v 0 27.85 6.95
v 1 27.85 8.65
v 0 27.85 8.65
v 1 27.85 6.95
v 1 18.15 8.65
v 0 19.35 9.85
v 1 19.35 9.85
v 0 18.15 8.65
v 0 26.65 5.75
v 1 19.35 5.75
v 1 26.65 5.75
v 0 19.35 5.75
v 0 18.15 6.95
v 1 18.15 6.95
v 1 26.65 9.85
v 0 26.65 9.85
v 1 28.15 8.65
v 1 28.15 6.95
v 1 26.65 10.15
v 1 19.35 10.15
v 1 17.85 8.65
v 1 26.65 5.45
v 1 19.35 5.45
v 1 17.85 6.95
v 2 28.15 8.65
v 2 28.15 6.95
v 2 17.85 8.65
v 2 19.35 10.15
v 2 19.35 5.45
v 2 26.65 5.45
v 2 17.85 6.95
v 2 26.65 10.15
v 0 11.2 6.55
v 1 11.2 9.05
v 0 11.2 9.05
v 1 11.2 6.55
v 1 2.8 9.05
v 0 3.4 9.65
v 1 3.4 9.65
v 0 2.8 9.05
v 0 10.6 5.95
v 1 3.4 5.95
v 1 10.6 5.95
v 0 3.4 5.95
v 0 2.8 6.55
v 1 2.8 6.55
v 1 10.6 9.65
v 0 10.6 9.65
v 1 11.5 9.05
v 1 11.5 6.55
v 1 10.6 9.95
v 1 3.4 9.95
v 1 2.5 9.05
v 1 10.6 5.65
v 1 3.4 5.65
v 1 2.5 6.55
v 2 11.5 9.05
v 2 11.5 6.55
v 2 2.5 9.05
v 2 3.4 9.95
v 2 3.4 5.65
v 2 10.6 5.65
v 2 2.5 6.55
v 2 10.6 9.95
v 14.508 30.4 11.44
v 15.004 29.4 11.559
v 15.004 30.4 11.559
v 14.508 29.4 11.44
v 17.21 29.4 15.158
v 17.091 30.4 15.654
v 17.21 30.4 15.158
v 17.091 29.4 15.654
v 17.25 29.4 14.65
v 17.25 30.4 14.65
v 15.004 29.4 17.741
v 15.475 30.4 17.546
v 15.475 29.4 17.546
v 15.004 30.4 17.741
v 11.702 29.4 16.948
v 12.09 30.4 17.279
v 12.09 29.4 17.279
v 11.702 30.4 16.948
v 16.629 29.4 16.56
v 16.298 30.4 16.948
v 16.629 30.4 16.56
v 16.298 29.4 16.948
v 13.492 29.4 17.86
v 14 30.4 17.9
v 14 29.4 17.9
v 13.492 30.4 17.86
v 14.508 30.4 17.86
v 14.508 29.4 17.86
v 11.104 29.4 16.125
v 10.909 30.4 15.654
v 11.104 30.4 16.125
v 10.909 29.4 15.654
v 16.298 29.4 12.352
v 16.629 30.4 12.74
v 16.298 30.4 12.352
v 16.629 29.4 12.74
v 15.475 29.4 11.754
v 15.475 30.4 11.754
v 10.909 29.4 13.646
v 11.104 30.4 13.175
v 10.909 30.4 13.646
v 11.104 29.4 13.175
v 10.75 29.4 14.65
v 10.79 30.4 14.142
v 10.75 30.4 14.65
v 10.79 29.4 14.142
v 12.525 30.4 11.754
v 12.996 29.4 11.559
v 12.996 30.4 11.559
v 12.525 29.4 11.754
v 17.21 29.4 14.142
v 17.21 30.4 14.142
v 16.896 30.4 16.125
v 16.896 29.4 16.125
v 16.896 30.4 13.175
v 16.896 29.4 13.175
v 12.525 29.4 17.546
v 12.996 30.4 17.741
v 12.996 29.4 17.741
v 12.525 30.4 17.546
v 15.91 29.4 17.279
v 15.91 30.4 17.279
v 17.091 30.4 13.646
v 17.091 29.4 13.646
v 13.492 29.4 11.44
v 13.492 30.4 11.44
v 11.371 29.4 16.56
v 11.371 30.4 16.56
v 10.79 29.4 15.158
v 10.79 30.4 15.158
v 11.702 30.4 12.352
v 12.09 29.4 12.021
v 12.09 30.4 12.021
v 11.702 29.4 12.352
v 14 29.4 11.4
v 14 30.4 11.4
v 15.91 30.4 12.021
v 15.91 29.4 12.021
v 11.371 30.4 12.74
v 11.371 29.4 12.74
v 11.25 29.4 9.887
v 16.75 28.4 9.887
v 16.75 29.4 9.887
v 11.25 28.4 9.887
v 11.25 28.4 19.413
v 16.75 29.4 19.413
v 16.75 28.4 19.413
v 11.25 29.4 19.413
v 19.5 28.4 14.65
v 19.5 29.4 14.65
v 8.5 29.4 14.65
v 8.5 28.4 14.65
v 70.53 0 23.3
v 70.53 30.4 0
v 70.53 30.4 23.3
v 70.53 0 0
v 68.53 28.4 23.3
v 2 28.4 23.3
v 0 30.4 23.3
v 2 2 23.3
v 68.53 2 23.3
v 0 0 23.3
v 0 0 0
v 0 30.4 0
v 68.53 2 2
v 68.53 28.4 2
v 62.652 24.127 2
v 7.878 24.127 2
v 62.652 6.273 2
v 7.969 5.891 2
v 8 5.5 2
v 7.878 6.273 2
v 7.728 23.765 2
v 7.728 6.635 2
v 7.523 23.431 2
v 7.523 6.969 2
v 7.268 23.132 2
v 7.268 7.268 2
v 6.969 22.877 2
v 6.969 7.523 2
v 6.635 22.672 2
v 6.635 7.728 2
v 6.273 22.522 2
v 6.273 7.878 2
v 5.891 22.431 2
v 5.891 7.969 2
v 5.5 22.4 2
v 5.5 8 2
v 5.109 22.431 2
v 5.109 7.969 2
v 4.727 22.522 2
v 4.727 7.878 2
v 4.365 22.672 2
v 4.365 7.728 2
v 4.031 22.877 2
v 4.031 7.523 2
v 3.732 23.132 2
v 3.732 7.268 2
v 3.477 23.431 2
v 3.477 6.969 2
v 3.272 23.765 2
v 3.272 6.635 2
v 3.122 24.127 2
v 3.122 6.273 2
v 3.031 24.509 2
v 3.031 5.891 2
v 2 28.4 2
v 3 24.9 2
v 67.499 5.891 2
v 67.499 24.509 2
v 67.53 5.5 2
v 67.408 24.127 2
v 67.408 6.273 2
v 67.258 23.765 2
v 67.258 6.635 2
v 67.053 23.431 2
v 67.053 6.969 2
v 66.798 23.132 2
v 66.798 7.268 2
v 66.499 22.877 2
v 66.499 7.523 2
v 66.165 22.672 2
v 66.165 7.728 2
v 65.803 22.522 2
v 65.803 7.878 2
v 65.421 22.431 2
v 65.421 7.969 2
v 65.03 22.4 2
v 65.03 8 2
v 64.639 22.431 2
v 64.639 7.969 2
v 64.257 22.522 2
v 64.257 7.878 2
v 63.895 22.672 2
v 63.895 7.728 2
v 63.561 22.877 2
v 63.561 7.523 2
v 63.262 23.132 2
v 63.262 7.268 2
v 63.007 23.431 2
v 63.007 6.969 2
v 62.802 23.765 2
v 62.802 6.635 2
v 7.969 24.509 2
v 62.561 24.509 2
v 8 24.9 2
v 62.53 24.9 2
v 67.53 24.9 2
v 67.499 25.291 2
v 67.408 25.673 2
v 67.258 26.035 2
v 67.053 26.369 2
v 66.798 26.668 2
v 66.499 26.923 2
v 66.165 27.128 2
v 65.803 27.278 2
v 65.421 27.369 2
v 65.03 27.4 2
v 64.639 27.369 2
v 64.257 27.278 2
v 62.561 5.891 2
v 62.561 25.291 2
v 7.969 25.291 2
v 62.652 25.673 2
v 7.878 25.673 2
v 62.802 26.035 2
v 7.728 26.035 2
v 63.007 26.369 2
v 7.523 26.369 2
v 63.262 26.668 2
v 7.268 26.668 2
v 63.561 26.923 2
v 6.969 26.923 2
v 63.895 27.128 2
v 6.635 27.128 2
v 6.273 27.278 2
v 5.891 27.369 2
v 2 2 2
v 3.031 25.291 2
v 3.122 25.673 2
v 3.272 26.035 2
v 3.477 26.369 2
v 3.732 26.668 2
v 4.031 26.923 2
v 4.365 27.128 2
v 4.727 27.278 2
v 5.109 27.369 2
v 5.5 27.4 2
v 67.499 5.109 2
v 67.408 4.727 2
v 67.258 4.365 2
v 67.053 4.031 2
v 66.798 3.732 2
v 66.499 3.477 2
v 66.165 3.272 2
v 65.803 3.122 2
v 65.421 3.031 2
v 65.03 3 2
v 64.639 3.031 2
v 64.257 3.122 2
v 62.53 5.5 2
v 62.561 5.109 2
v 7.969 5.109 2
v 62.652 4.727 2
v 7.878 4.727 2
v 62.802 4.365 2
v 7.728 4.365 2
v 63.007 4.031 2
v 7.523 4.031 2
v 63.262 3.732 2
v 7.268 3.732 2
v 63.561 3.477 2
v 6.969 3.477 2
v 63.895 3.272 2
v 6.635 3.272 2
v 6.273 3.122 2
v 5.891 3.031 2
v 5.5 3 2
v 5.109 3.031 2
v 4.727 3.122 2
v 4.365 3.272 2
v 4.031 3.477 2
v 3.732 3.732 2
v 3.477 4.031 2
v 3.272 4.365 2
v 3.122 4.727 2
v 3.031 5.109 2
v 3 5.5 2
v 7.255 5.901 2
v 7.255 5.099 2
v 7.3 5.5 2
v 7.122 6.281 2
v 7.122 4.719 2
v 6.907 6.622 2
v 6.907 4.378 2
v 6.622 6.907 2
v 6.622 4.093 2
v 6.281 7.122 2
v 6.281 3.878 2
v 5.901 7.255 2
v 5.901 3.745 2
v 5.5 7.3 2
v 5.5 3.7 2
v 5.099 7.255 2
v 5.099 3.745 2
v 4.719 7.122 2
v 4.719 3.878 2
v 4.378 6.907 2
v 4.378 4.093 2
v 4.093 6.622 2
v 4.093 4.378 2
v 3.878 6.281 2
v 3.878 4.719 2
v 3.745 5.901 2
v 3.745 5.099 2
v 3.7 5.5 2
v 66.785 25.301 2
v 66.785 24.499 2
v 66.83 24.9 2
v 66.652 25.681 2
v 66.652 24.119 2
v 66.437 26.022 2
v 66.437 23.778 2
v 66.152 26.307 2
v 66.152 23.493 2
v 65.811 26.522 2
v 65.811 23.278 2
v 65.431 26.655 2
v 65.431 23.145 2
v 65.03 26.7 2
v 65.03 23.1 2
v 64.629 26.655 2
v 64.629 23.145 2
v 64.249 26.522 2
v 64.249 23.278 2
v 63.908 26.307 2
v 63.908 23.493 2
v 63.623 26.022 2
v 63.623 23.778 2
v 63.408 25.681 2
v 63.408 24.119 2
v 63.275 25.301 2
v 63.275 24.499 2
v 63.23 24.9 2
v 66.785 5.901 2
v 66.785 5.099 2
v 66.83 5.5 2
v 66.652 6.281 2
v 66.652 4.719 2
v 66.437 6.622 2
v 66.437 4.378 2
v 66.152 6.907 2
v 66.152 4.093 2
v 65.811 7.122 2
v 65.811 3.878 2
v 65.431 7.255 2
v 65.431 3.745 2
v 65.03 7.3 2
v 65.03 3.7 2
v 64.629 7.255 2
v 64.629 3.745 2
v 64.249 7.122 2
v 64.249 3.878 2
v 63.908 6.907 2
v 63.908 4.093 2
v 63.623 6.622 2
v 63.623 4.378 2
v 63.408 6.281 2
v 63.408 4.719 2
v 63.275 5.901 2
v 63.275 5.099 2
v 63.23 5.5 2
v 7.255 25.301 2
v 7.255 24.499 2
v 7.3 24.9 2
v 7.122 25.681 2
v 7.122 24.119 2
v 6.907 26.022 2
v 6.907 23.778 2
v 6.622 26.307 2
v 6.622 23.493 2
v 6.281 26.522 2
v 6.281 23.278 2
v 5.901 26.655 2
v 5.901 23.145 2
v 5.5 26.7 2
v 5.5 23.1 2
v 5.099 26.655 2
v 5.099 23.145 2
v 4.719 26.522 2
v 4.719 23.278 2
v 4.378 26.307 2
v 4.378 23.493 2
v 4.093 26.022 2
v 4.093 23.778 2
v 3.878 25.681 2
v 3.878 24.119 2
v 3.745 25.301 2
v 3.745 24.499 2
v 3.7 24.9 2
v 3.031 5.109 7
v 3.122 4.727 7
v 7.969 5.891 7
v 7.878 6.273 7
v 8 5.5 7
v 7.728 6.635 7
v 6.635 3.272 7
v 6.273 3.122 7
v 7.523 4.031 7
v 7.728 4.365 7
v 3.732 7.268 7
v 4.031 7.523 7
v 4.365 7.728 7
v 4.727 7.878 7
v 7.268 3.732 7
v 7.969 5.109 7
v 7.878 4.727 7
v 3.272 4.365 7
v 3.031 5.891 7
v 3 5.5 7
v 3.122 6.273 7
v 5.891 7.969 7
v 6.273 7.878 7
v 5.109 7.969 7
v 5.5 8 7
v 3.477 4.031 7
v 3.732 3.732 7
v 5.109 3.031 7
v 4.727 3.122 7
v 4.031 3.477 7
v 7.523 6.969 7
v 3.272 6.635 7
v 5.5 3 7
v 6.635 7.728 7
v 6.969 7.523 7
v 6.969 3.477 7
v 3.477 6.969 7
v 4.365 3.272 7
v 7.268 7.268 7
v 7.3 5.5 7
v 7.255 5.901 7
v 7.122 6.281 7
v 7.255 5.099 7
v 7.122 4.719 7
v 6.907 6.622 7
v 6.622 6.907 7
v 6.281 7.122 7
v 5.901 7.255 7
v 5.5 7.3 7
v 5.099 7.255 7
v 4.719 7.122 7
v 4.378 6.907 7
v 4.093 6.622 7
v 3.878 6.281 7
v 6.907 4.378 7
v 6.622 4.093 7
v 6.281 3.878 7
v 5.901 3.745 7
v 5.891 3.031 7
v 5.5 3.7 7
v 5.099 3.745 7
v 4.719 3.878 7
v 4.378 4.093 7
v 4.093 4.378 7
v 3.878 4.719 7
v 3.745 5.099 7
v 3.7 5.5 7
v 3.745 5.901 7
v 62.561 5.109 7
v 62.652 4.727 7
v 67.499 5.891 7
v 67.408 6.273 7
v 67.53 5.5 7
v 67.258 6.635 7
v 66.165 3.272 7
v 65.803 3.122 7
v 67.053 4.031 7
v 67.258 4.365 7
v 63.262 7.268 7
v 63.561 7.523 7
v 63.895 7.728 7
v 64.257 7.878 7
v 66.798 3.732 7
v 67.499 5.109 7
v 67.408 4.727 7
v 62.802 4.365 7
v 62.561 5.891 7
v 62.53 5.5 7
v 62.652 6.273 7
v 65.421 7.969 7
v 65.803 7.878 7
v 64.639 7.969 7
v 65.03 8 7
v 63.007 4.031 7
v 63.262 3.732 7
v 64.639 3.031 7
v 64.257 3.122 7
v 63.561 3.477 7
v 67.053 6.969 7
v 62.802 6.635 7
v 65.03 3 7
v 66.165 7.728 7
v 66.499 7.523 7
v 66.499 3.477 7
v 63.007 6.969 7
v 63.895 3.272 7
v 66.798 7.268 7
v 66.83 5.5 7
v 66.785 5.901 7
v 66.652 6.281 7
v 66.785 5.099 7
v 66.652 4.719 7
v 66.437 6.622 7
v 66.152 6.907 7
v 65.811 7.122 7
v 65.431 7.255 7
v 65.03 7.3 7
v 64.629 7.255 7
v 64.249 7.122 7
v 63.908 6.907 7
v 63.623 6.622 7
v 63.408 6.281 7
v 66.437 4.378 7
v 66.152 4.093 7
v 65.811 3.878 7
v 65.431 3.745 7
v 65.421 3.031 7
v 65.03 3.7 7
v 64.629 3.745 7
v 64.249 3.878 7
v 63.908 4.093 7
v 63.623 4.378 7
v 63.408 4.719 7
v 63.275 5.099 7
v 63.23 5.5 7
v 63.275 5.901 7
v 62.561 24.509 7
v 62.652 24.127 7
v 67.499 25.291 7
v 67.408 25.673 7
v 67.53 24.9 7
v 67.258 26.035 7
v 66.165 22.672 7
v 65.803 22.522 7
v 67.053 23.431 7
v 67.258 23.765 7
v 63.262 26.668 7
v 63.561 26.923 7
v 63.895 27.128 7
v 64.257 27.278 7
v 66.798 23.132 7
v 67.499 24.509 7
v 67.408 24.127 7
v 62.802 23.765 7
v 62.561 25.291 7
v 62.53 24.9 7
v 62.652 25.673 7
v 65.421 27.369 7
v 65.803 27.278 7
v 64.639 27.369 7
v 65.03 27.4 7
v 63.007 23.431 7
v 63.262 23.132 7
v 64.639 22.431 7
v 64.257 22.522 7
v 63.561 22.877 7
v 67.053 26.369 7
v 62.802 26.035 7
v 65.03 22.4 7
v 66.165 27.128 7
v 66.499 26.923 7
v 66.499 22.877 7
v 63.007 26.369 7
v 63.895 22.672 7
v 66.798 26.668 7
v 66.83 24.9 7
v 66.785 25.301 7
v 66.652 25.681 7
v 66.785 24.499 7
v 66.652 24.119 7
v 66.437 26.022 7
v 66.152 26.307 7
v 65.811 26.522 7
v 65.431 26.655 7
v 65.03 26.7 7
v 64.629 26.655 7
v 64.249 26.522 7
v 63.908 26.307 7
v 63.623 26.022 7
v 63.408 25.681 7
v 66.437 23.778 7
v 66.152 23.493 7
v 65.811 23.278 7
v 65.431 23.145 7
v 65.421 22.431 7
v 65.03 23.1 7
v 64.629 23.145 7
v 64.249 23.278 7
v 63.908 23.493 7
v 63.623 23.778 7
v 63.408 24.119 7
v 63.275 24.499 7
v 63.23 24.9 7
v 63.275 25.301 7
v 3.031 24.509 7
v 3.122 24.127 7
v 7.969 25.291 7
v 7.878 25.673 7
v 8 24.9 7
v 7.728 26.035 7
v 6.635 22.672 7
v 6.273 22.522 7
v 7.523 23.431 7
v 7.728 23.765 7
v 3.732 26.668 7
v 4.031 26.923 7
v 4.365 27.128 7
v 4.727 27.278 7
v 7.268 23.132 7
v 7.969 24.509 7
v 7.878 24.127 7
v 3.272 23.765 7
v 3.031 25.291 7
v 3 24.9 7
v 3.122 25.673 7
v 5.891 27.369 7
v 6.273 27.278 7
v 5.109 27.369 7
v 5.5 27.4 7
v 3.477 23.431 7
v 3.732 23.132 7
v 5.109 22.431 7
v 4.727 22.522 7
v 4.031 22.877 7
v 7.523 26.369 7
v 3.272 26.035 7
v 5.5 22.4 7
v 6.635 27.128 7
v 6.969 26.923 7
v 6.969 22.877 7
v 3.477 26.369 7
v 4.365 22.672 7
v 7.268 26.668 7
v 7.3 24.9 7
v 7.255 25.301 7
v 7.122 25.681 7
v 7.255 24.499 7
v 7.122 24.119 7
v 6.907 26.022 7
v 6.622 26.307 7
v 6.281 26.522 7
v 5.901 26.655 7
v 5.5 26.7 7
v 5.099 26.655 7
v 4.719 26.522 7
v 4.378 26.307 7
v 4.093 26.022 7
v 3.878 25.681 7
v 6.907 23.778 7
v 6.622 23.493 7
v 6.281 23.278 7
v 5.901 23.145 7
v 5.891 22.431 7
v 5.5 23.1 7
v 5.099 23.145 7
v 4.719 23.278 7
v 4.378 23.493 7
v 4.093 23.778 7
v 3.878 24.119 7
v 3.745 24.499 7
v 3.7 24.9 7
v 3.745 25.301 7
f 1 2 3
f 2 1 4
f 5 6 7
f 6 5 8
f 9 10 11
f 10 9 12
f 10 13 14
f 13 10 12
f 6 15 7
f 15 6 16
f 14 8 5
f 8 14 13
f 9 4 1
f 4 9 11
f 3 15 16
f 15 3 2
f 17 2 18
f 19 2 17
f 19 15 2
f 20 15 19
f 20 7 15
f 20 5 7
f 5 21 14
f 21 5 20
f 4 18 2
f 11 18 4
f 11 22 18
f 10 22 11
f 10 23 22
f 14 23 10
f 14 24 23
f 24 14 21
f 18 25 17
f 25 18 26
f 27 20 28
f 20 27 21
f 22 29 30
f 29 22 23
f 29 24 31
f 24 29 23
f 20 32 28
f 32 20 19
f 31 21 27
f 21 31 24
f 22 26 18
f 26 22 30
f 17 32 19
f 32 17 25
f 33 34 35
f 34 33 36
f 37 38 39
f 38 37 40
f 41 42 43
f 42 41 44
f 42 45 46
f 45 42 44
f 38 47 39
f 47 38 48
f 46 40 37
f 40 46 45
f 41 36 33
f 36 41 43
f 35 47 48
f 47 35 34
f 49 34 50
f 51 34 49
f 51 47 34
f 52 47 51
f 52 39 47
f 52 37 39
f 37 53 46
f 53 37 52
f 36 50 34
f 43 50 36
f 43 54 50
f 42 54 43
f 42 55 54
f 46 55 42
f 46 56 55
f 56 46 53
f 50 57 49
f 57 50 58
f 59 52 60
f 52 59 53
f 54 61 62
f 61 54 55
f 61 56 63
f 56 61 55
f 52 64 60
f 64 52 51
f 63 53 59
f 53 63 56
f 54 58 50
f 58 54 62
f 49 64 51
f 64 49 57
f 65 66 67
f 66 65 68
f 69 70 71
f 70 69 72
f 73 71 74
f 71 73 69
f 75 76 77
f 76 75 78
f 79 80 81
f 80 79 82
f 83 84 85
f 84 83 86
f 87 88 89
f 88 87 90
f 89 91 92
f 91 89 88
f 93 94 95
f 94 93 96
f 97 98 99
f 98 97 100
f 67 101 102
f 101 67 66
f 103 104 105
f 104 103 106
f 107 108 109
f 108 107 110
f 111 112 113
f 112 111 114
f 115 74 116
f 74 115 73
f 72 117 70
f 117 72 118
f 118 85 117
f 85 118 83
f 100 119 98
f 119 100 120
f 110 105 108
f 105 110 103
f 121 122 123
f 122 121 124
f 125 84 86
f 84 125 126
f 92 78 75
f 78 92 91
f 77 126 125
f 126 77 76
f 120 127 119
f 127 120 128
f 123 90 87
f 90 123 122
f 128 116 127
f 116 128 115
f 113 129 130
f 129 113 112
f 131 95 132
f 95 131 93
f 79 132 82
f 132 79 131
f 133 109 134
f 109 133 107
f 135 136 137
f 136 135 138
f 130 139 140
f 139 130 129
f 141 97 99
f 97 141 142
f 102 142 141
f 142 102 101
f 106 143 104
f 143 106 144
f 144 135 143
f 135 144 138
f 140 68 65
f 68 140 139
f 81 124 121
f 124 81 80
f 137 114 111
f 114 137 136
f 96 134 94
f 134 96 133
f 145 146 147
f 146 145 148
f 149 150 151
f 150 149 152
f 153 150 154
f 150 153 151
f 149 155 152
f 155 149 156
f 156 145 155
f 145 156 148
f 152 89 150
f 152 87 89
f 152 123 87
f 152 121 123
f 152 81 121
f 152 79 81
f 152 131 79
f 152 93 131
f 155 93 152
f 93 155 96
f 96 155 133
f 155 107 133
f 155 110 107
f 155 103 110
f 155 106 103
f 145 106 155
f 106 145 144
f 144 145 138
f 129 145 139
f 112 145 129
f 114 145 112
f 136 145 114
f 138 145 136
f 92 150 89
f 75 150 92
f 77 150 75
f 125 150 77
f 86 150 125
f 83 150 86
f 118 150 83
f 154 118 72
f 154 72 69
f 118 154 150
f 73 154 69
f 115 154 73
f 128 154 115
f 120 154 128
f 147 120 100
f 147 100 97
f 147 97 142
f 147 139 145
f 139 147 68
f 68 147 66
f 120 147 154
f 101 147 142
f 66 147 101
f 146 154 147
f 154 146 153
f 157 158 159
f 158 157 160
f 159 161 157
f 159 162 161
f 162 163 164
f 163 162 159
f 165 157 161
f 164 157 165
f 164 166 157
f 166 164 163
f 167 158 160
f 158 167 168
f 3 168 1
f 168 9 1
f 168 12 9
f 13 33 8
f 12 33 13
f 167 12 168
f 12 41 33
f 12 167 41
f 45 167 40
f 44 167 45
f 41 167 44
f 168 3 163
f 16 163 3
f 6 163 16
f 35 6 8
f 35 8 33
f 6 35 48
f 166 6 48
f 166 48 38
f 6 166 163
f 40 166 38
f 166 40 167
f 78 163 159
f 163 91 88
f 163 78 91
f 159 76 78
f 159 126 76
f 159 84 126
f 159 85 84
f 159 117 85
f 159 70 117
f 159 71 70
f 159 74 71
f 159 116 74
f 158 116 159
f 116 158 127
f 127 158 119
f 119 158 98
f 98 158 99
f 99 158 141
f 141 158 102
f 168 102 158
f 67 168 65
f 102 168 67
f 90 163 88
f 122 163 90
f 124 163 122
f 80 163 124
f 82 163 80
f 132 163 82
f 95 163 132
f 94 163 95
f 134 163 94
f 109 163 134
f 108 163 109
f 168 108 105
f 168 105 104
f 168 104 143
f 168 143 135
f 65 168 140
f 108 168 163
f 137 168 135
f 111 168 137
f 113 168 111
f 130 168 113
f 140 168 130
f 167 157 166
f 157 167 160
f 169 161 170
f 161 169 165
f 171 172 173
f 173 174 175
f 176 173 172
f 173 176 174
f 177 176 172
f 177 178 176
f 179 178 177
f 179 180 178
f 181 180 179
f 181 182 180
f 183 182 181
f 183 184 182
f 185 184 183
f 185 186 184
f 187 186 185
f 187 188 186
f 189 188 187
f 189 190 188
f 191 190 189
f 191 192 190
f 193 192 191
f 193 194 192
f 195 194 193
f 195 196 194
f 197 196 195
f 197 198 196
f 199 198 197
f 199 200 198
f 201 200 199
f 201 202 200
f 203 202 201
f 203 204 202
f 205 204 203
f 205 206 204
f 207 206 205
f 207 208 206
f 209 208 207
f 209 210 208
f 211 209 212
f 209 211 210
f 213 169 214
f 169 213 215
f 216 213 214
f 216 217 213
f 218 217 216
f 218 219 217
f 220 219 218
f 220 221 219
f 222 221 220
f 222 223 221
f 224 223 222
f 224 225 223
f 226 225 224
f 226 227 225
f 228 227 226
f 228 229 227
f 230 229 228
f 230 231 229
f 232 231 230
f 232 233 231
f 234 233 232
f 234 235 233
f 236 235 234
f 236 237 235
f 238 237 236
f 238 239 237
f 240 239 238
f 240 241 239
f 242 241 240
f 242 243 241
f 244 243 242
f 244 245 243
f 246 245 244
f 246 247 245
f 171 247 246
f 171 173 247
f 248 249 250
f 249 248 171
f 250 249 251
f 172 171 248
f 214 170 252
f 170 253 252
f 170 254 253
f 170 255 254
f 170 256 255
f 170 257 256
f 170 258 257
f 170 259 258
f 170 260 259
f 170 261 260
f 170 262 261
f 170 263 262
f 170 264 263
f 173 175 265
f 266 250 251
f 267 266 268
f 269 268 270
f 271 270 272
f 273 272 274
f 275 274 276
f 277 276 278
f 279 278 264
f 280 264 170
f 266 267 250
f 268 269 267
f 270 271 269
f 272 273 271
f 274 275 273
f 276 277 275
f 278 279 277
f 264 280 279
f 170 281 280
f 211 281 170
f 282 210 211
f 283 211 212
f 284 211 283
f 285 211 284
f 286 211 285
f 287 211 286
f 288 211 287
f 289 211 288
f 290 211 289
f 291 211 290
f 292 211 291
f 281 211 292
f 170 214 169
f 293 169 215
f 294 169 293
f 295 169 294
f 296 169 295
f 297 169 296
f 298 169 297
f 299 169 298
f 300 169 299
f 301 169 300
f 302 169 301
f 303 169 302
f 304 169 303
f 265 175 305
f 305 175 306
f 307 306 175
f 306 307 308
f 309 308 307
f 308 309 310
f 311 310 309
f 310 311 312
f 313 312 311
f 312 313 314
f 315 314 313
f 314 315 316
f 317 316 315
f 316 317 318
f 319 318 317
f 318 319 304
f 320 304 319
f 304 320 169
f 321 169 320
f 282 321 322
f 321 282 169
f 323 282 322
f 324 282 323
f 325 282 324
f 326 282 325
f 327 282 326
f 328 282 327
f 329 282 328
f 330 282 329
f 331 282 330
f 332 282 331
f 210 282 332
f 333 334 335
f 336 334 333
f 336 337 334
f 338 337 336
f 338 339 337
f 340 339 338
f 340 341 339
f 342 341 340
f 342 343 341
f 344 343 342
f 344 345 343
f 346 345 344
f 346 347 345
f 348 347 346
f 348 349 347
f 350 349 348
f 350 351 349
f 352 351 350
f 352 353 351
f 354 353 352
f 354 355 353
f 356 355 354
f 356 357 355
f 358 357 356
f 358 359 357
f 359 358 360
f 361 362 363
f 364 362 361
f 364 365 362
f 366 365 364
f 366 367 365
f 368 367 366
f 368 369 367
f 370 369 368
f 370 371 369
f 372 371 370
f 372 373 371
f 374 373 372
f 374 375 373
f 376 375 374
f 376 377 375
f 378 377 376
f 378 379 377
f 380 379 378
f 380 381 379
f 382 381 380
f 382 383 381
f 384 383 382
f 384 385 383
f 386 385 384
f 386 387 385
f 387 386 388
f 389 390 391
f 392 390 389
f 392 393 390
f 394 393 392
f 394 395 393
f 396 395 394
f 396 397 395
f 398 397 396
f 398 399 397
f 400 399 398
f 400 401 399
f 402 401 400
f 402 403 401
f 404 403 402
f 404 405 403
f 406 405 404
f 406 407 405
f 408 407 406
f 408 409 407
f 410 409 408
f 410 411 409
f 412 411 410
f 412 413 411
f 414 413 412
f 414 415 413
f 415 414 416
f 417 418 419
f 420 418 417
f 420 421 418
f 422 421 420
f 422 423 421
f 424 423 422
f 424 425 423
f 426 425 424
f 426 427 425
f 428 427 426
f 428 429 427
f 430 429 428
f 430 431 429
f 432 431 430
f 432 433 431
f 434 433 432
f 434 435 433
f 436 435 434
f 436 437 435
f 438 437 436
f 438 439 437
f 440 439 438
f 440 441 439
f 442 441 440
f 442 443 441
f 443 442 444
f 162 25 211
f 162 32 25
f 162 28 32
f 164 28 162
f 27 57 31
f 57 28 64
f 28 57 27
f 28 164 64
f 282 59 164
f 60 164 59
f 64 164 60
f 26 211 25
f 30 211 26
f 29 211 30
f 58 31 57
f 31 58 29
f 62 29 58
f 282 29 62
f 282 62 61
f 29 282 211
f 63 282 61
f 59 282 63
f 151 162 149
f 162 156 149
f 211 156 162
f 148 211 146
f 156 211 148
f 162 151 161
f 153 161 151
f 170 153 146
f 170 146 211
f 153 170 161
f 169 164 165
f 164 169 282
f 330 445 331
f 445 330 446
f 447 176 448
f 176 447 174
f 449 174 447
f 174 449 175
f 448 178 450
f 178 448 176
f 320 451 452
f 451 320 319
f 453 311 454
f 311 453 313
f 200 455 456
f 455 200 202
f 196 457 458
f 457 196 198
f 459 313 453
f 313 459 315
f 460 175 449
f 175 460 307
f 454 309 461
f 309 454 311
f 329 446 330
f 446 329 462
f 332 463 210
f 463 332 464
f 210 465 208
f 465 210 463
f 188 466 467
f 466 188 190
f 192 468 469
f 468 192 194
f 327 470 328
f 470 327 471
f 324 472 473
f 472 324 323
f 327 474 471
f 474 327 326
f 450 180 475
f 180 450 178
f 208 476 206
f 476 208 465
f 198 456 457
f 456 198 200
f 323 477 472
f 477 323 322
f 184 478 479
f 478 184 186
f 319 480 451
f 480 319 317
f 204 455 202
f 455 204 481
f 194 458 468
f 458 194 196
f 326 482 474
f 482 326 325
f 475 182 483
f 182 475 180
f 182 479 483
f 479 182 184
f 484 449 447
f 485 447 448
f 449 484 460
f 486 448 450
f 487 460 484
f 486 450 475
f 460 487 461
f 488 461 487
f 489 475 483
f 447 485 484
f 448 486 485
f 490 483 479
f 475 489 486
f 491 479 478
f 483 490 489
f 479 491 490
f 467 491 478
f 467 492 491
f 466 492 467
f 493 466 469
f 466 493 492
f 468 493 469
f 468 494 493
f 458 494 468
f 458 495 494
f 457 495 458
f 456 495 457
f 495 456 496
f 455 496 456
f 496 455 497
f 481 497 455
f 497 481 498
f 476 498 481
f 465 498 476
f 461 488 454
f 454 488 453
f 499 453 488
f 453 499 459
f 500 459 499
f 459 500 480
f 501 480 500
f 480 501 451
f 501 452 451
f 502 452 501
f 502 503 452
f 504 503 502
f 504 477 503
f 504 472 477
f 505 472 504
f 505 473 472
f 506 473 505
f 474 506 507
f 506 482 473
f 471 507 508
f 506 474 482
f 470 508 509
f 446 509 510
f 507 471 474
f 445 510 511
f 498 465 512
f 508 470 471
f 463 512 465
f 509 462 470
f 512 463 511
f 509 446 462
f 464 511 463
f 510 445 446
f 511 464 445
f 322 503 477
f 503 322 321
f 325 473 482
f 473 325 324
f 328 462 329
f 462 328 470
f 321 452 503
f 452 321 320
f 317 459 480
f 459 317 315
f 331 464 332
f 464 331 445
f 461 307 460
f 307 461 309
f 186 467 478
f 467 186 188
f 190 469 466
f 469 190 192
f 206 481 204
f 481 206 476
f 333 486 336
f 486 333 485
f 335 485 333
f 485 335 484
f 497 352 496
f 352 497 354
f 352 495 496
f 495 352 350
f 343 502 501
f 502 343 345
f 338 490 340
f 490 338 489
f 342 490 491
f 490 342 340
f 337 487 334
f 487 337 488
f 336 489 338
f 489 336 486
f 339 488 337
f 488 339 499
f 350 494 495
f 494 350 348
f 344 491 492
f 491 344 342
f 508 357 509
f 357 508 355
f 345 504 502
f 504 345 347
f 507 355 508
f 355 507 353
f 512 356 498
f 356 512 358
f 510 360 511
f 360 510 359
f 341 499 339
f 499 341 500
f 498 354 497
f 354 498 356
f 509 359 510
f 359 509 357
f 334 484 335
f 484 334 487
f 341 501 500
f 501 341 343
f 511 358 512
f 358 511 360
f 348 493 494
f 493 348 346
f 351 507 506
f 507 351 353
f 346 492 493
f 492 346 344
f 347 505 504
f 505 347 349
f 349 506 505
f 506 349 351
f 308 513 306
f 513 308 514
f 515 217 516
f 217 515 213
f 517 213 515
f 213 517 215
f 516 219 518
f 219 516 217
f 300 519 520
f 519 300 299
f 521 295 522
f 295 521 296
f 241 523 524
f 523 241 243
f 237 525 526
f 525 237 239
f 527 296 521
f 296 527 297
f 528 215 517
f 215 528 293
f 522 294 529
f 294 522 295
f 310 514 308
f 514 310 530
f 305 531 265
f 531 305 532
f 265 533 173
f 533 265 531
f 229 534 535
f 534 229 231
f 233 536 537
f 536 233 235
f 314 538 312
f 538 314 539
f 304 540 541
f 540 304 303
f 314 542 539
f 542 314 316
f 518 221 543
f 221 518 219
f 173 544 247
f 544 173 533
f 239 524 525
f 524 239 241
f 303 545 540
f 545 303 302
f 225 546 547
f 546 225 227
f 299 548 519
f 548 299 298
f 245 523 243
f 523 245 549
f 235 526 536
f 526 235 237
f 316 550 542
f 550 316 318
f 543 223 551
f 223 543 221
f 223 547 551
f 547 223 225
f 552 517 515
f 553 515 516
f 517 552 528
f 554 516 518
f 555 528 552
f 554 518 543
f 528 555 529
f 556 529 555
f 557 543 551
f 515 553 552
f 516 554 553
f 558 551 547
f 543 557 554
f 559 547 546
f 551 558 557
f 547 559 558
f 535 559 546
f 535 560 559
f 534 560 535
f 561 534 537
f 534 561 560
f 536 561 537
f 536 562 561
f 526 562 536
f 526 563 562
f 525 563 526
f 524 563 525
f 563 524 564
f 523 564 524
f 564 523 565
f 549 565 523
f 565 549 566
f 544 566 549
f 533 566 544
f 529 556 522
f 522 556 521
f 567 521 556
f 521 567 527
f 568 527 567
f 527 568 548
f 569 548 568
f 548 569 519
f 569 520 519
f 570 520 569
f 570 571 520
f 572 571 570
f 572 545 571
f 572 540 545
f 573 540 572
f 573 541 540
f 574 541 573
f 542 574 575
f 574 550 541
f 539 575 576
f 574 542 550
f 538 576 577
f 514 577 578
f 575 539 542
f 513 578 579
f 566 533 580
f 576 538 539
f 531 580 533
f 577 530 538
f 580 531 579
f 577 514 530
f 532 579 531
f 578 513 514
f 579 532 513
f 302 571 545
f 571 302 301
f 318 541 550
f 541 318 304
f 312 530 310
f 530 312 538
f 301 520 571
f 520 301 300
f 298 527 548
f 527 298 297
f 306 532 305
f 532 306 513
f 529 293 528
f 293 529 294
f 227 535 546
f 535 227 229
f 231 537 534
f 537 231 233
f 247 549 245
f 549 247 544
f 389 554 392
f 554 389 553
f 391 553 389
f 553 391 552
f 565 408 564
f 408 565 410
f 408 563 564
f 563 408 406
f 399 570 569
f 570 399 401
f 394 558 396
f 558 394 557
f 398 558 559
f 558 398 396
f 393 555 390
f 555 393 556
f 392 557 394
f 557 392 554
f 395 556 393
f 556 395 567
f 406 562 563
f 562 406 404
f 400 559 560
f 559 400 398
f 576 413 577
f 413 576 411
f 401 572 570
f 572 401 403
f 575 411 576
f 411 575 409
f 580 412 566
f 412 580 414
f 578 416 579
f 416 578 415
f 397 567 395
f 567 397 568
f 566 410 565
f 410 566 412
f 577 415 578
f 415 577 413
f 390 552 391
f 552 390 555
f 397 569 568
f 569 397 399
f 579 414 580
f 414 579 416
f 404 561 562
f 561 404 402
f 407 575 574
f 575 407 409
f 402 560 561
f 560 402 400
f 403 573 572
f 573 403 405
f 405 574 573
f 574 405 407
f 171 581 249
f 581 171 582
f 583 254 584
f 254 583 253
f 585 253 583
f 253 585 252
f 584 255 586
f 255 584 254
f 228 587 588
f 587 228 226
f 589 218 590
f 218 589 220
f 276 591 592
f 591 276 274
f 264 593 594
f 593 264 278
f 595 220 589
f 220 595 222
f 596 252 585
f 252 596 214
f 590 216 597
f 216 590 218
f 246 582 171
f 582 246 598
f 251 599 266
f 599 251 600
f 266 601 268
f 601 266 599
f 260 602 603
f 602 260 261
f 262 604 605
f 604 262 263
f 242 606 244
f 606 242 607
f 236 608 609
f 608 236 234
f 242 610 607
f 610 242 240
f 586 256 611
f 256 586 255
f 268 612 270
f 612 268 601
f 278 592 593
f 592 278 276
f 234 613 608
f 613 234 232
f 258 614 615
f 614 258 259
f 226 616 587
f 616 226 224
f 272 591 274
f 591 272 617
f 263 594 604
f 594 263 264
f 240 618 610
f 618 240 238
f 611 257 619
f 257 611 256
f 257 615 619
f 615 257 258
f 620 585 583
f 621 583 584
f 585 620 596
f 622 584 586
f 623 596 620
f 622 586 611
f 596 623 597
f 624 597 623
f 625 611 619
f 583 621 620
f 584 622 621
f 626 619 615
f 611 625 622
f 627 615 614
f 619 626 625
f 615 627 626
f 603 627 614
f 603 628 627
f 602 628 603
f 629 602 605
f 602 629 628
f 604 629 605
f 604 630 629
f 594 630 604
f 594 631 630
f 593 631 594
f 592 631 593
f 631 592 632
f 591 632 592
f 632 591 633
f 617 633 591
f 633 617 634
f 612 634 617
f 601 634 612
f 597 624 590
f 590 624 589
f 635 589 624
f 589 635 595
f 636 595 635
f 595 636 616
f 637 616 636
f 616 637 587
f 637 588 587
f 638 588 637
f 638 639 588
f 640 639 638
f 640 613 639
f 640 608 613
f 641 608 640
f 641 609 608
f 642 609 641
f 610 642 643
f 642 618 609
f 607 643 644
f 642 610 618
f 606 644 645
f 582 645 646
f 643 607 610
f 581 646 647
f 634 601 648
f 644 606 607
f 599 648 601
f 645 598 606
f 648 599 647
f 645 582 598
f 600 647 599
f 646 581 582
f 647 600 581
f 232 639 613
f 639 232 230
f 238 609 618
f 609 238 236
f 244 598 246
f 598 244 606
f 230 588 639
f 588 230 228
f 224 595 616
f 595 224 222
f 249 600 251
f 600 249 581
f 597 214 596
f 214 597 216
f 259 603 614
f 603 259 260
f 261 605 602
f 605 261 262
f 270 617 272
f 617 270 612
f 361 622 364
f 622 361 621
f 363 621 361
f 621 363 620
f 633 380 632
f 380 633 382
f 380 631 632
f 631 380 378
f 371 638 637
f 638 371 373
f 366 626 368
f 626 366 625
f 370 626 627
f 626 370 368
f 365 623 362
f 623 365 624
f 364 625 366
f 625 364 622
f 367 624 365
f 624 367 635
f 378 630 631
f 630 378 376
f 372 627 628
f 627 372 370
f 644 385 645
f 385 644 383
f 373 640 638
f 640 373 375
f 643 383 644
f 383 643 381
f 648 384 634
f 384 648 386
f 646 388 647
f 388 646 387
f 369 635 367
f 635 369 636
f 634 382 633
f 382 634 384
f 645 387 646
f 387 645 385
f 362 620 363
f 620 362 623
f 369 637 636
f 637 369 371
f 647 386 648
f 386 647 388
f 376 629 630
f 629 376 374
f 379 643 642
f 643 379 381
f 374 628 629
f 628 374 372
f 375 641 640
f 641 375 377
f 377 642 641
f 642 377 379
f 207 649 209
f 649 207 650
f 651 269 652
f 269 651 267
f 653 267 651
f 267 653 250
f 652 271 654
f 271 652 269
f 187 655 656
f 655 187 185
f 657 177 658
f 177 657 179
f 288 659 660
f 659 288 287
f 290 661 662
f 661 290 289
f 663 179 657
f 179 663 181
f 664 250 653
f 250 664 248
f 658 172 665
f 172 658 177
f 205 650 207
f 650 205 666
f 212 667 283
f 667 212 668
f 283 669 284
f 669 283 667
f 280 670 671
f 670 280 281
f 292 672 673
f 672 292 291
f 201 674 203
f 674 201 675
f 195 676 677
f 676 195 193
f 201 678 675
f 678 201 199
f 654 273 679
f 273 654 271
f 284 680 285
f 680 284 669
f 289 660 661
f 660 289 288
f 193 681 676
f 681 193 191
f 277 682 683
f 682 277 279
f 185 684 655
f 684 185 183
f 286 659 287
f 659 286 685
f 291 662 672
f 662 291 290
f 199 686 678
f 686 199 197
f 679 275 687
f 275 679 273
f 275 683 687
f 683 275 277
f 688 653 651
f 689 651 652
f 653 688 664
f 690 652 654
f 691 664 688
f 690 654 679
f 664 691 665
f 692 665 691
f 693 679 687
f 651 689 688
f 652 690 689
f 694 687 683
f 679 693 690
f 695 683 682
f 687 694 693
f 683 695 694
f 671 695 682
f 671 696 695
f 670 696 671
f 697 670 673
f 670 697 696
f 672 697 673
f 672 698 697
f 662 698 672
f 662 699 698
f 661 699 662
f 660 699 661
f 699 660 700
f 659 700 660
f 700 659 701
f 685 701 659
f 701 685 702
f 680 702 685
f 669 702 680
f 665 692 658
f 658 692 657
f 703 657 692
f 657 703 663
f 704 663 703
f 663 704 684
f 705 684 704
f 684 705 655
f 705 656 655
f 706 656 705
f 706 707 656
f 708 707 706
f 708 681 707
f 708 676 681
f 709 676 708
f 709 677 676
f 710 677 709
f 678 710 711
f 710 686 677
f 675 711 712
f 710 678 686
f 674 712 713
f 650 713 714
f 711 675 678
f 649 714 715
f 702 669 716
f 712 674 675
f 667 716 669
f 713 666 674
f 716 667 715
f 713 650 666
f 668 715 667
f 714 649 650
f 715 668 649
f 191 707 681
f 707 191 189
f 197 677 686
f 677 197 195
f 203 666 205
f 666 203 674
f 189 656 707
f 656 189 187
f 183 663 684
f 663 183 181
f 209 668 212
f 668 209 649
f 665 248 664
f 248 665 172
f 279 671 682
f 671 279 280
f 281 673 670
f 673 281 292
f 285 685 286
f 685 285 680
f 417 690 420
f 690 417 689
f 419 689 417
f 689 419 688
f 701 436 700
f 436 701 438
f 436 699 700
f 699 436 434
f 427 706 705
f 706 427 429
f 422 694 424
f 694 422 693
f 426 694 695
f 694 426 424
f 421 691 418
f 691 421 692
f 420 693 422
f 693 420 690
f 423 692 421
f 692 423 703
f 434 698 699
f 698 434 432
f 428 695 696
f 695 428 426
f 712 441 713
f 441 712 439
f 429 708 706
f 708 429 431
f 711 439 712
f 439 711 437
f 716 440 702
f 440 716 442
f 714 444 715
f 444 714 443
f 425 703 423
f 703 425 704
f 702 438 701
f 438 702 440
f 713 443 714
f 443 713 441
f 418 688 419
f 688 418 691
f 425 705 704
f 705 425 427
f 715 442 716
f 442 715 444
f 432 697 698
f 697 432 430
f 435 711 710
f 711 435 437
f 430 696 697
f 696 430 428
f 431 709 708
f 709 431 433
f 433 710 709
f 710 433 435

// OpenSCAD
//  SELECT PART  
PART = "bottom"; // ["bottom","top","both"]

//  MAIN PCB DIMENSIONS
board_len = 65.53;         // x
board_wid = 25.40;         // Y
board_thk = 1.6;           // PCB thickness

// Tallest components (above PCB top / below PCB bottom)
comp_bottom = 3.0;
comp_top    = 12.1;        // ≈ 0.54" total - 1.6mm PCB

//  PLASTIC THICKNESSES & CLEARANCES 
wall  = 2.0;
floor = 2.0;
lid   = 2.0;

clear_xy = 0.5;            // side clearance
clear_z  = 0.6;            // vertical breathing room

//  USB PORT #1
// NOTE: "short" => long X wall; "long" => short Y wall (the PCB end)
usb_present = true;
usb_is_typeC = true;       // set false if you switch to USB-A sizes
usb_side = "long";
usb_offset_from_left = 21;
usb_wall_clearance   = 0.40;

// USB PORT #2 (Micro-USB)
usb2_present = true;
usb2_is_typeC = false;     // micro
usb2_side = "long";
usb2_offset_from_left = 5;
usb2_wall_clearance   = 0.40;

// USB shell sizes (re-measure)
usbC_w=8.9;  usbC_h=3.3;  usbC_depth=6.5;
micro_w=7.6; micro_h=2.9; micro_depth=6.0;

//  SMA ANTENNA 
antenna_bulkhead = true;
sma_on_short_side = true;        // true => use a LONG wall (X)
sma_long_wall_face = "far";      // ["near","far"]
sma_offset_from_left = 12;
sma_hole_d = 6.5;
sma_flat_clear = 11.0;

//  VENTING 
side_vents = false;
lid_vents  = true;
vent_slot  = [1.2, 12];
vent_pitch = 4.0;

//  LID LIP (filled lid with overlap) 
lid_rabbet_depth = 1.0;
lid_rabbet_clear = 0.25;

//  STANDOFFS / MOUNTING 
standoff_h=5.0;
standoff_d=5.0;
insert_hole_d=3.6;         // for M2.5 heat-set insert
through_hole_d=2.6;        // M2.5 clearance

hole_inset=3.0;
mount_holes=[
  [hole_inset,            hole_inset],
  [board_len-hole_inset,  hole_inset],
  [board_len-hole_inset,  board_wid-hole_inset],
  [hole_inset,            board_wid-hole_inset]
];

//  DERIVED DIMENSIONS 
inner_len = board_len + 2*clear_xy;
inner_wid = board_wid + 2*clear_xy;
body_len  = inner_len + 2*wall;
body_wid  = inner_wid + 2*wall;

base_cavity = floor + standoff_h + board_thk + comp_top + clear_z;
lid_inner   = lid;
body_ht     = base_cavity + lid_inner;

//  Toggles (preview helpers) 
show_pcb_preview = true;   // set false to hide green board
show_usb_markers = false;  // set true to see small spheres at USB centers

// 
// Helpers
// 
module horiz_slot(len,wid,thk){ cube([len,wid,thk],center=true); }
module pcb_outline(){ cube([board_len,board_wid,board_thk],center=false); }

module standoff(pos,through=false){
  translate([wall+clear_xy+pos[0], wall+clear_xy+pos[1], floor])
  difference(){
    cylinder(h=standoff_h,d=standoff_d,$fn=40);
    translate([0,0,-0.1])
      cylinder(h=standoff_h+0.2, d=(through?through_hole_d:insert_hole_d), $fn=28);
  }
}

//  Rounded-rectangle helpers (for nice USB openings) 
module _roundrect_2d(w,h,r){
  r = min(r, w/2, h/2);
  offset(r=r) square([w-2*r, h-2*r], center=true);
}
module rr_y(w,h,thk,r){ // through Y (long X wall)
  rotate([90,0,0]) linear_extrude(height=thk, center=true) _roundrect_2d(w,h,r);
}
module rr_x(w,h,thk,r){ // through X (short Y wall)
  rotate([0,90,0]) linear_extrude(height=thk, center=true) _roundrect_2d(w,h,r);
}
micro_corner_r = 0.6;
usbC_corner_r  = 1.2;


// USB CUTOUTS (two ports) — rounded

module usb_cutout_port(is_typeC, side, offset_from_left, wall_clear){
  usb_w   = is_typeC ? usbC_w : micro_w;
  usb_h   = is_typeC ? usbC_h : micro_h;
  depth   = is_typeC ? usbC_depth : micro_depth;
  slack_w = usb_w + 2*wall_clear;
  slack_h = usb_h + 2*wall_clear;
  cr      = is_typeC ? usbC_corner_r : micro_corner_r;
  flare   = 0.6; // inside relief

  if (side=="short"){ // long X wall => extrude along Y
    x = offset_from_left + wall;
    z = floor + standoff_h + board_thk/2;
    translate([x,-0.01,z]) rr_y(slack_w,slack_h,wall+0.02,cr);
    translate([x, wall + depth/2, z]) rr_y(slack_w+flare,slack_h+flare,depth+2,cr+0.3);
  } else {            // short Y wall => extrude along X (swap w,h so width is horizontal)
    y = offset_from_left + wall;
    z = floor + standoff_h + board_thk/2;
    translate([-0.01,y,z]) rr_x(slack_h,slack_w,wall+0.02,cr);
    translate([wall + depth/2, y, z]) rr_x(slack_h+flare,slack_w+flare,depth+2,cr+0.3);
  }
}

module usb_cutouts(){
  if (usb_present)
    usb_cutout_port(usb_is_typeC, usb_side, usb_offset_from_left, usb_wall_clearance);
  if (usb2_present)
    usb_cutout_port(usb2_is_typeC, usb2_side, usb2_offset_from_left, usb2_wall_clearance);
}

// Optional USB center markers
module _usb_center_markers(){
  z = floor + standoff_h + board_thk/2;
  if (usb_present){
    if (usb_side=="short") translate([usb_offset_from_left+wall, wall/2, z]) color("red") sphere(d=1.8);
    else                   translate([wall/2, usb_offset_from_left+wall, z]) color("red") sphere(d=1.8);
  }
  if (usb2_present){
    if (usb2_side=="short") translate([usb2_offset_from_left+wall, wall/2, z]) color("lime") sphere(d=1.8);
    else                    translate([wall/2, usb2_offset_from_left+wall, z]) color("lime") sphere(d=1.8);
  }
}
if (show_usb_markers) %_usb_center_markers();


// SMA HOLE

module sma_hole(){
  if (antenna_bulkhead){
    if (sma_on_short_side){   // LONG wall (X)
      x = sma_offset_from_left + wall;
      z = floor + standoff_h + board_thk + comp_top/2;
      y_hole   = (sma_long_wall_face=="near") ? -0.01            : (body_wid + 0.01);
      y_recess = (sma_long_wall_face=="near") ?  wall/2          : (body_wid - wall/2);
      translate([x, y_hole, z]) rotate([90,0,0]) cylinder(h=wall+0.02, d=sma_hole_d, $fn=40);
      translate([x, y_recess, z]) rotate([90,0,0]) cylinder(h=1.6, d=sma_flat_clear, $fn=6);
    } else {                  // SHORT wall (Y)
      x = body_len/2;
      y = sma_offset_from_left + wall;
      z = floor + standoff_h + board_thk + comp_top/2;
      translate([-0.01,y,z]) rotate([0,90,0]) cylinder(h=wall+0.02, d=sma_hole_d, $fn=40);
      translate([wall/2, y, z]) rotate([0,90,0]) cylinder(h=1.6, d=sma_flat_clear, $fn=6);
    }
  }
}


// Side vents (slots)

module vent_slots_on_wall(short_side=true){
  len    = short_side ? body_len : body_wid;
  usable = len - 20;
  count  = max(0, floor(usable/vent_pitch));
  for(i=[0:count-1]){
    pos = 10 + (i+0.5)/count * usable;
    if(short_side){
      translate([pos,-0.01, body_ht/2]) rotate([90,0,0]) horiz_slot(vent_slot[1], vent_slot[0], wall+0.02);
    } else {
      translate([-0.01,pos, body_ht/2]) rotate([0,90,0]) horiz_slot(vent_slot[1], vent_slot[0], wall+0.02);
    }
  }
}


// Lid vents (grid)

module lid_vent_field(){
  if (lid_vents){
    rows = 5;
    cols = max(0, floor((inner_len-20)/vent_pitch));
    for(r=[0:rows-1]) for(c=[0:cols-1]){
      x = wall+10+c*vent_pitch;
      y = wall + inner_wid/2 - (rows/2 - 0.5)*vent_pitch + r*vent_pitch;
      z = body_ht - lid/2;
      translate([x,y,z]) cube([vent_slot[1], vent_slot[0], lid+0.02], center=true);
    }
  }
}


// Bottom shell (floor + walls + bosses)

module bottom_shell(){
  difference(){
    // outer body
    cube([body_len,body_wid,body_ht],center=false);
    // inner cavity
    translate([wall,wall,lid]) cube([inner_len,inner_wid,body_ht-lid],center=false);

    // cutouts
    usb_cutouts();
    if(side_vents){ vent_slots_on_wall(true); vent_slots_on_wall(false); }
    sma_hole();
  }

  // bosses/standoffs under PCB
  for(p=mount_holes) standoff(p,false);

  // PCB preview (won't export)
  if (show_pcb_preview)
    %color([0,1,0,0.15]) translate([wall+clear_xy, wall+clear_xy, floor+standoff_h]) pcb_outline();
}


// Top lid (filled, with shallow overlap lip)

module top_lid(){
  difference(){
    // solid plate
    translate([0,0,body_ht-lid]) cube([body_len,body_wid,lid],center=false);

    // shallow lip recess
    translate([wall - lid_rabbet_clear,
               wall - lid_rabbet_clear,
               body_ht - lid - 0.01])
      cube([inner_len + 2*lid_rabbet_clear,
            inner_wid + 2*lid_rabbet_clear,
            lid_rabbet_depth + 0.02], center=false);

    // screw through-holes
    for(p=mount_holes)
      translate([wall+clear_xy+p[0], wall+clear_xy+p[1], body_ht-lid-0.01])
        cylinder(h=lid+0.02, d=through_hole_d, $fn=28);

    // lid vents
    lid_vent_field();
  }
}


// Render selector

if (PART=="bottom") color("gainsboro") bottom_shell();
else if (PART=="top") color("white") top_lid();
else { color("gainsboro") bottom_shell(); color([1,1,1,0.35]) top_lid(); }
